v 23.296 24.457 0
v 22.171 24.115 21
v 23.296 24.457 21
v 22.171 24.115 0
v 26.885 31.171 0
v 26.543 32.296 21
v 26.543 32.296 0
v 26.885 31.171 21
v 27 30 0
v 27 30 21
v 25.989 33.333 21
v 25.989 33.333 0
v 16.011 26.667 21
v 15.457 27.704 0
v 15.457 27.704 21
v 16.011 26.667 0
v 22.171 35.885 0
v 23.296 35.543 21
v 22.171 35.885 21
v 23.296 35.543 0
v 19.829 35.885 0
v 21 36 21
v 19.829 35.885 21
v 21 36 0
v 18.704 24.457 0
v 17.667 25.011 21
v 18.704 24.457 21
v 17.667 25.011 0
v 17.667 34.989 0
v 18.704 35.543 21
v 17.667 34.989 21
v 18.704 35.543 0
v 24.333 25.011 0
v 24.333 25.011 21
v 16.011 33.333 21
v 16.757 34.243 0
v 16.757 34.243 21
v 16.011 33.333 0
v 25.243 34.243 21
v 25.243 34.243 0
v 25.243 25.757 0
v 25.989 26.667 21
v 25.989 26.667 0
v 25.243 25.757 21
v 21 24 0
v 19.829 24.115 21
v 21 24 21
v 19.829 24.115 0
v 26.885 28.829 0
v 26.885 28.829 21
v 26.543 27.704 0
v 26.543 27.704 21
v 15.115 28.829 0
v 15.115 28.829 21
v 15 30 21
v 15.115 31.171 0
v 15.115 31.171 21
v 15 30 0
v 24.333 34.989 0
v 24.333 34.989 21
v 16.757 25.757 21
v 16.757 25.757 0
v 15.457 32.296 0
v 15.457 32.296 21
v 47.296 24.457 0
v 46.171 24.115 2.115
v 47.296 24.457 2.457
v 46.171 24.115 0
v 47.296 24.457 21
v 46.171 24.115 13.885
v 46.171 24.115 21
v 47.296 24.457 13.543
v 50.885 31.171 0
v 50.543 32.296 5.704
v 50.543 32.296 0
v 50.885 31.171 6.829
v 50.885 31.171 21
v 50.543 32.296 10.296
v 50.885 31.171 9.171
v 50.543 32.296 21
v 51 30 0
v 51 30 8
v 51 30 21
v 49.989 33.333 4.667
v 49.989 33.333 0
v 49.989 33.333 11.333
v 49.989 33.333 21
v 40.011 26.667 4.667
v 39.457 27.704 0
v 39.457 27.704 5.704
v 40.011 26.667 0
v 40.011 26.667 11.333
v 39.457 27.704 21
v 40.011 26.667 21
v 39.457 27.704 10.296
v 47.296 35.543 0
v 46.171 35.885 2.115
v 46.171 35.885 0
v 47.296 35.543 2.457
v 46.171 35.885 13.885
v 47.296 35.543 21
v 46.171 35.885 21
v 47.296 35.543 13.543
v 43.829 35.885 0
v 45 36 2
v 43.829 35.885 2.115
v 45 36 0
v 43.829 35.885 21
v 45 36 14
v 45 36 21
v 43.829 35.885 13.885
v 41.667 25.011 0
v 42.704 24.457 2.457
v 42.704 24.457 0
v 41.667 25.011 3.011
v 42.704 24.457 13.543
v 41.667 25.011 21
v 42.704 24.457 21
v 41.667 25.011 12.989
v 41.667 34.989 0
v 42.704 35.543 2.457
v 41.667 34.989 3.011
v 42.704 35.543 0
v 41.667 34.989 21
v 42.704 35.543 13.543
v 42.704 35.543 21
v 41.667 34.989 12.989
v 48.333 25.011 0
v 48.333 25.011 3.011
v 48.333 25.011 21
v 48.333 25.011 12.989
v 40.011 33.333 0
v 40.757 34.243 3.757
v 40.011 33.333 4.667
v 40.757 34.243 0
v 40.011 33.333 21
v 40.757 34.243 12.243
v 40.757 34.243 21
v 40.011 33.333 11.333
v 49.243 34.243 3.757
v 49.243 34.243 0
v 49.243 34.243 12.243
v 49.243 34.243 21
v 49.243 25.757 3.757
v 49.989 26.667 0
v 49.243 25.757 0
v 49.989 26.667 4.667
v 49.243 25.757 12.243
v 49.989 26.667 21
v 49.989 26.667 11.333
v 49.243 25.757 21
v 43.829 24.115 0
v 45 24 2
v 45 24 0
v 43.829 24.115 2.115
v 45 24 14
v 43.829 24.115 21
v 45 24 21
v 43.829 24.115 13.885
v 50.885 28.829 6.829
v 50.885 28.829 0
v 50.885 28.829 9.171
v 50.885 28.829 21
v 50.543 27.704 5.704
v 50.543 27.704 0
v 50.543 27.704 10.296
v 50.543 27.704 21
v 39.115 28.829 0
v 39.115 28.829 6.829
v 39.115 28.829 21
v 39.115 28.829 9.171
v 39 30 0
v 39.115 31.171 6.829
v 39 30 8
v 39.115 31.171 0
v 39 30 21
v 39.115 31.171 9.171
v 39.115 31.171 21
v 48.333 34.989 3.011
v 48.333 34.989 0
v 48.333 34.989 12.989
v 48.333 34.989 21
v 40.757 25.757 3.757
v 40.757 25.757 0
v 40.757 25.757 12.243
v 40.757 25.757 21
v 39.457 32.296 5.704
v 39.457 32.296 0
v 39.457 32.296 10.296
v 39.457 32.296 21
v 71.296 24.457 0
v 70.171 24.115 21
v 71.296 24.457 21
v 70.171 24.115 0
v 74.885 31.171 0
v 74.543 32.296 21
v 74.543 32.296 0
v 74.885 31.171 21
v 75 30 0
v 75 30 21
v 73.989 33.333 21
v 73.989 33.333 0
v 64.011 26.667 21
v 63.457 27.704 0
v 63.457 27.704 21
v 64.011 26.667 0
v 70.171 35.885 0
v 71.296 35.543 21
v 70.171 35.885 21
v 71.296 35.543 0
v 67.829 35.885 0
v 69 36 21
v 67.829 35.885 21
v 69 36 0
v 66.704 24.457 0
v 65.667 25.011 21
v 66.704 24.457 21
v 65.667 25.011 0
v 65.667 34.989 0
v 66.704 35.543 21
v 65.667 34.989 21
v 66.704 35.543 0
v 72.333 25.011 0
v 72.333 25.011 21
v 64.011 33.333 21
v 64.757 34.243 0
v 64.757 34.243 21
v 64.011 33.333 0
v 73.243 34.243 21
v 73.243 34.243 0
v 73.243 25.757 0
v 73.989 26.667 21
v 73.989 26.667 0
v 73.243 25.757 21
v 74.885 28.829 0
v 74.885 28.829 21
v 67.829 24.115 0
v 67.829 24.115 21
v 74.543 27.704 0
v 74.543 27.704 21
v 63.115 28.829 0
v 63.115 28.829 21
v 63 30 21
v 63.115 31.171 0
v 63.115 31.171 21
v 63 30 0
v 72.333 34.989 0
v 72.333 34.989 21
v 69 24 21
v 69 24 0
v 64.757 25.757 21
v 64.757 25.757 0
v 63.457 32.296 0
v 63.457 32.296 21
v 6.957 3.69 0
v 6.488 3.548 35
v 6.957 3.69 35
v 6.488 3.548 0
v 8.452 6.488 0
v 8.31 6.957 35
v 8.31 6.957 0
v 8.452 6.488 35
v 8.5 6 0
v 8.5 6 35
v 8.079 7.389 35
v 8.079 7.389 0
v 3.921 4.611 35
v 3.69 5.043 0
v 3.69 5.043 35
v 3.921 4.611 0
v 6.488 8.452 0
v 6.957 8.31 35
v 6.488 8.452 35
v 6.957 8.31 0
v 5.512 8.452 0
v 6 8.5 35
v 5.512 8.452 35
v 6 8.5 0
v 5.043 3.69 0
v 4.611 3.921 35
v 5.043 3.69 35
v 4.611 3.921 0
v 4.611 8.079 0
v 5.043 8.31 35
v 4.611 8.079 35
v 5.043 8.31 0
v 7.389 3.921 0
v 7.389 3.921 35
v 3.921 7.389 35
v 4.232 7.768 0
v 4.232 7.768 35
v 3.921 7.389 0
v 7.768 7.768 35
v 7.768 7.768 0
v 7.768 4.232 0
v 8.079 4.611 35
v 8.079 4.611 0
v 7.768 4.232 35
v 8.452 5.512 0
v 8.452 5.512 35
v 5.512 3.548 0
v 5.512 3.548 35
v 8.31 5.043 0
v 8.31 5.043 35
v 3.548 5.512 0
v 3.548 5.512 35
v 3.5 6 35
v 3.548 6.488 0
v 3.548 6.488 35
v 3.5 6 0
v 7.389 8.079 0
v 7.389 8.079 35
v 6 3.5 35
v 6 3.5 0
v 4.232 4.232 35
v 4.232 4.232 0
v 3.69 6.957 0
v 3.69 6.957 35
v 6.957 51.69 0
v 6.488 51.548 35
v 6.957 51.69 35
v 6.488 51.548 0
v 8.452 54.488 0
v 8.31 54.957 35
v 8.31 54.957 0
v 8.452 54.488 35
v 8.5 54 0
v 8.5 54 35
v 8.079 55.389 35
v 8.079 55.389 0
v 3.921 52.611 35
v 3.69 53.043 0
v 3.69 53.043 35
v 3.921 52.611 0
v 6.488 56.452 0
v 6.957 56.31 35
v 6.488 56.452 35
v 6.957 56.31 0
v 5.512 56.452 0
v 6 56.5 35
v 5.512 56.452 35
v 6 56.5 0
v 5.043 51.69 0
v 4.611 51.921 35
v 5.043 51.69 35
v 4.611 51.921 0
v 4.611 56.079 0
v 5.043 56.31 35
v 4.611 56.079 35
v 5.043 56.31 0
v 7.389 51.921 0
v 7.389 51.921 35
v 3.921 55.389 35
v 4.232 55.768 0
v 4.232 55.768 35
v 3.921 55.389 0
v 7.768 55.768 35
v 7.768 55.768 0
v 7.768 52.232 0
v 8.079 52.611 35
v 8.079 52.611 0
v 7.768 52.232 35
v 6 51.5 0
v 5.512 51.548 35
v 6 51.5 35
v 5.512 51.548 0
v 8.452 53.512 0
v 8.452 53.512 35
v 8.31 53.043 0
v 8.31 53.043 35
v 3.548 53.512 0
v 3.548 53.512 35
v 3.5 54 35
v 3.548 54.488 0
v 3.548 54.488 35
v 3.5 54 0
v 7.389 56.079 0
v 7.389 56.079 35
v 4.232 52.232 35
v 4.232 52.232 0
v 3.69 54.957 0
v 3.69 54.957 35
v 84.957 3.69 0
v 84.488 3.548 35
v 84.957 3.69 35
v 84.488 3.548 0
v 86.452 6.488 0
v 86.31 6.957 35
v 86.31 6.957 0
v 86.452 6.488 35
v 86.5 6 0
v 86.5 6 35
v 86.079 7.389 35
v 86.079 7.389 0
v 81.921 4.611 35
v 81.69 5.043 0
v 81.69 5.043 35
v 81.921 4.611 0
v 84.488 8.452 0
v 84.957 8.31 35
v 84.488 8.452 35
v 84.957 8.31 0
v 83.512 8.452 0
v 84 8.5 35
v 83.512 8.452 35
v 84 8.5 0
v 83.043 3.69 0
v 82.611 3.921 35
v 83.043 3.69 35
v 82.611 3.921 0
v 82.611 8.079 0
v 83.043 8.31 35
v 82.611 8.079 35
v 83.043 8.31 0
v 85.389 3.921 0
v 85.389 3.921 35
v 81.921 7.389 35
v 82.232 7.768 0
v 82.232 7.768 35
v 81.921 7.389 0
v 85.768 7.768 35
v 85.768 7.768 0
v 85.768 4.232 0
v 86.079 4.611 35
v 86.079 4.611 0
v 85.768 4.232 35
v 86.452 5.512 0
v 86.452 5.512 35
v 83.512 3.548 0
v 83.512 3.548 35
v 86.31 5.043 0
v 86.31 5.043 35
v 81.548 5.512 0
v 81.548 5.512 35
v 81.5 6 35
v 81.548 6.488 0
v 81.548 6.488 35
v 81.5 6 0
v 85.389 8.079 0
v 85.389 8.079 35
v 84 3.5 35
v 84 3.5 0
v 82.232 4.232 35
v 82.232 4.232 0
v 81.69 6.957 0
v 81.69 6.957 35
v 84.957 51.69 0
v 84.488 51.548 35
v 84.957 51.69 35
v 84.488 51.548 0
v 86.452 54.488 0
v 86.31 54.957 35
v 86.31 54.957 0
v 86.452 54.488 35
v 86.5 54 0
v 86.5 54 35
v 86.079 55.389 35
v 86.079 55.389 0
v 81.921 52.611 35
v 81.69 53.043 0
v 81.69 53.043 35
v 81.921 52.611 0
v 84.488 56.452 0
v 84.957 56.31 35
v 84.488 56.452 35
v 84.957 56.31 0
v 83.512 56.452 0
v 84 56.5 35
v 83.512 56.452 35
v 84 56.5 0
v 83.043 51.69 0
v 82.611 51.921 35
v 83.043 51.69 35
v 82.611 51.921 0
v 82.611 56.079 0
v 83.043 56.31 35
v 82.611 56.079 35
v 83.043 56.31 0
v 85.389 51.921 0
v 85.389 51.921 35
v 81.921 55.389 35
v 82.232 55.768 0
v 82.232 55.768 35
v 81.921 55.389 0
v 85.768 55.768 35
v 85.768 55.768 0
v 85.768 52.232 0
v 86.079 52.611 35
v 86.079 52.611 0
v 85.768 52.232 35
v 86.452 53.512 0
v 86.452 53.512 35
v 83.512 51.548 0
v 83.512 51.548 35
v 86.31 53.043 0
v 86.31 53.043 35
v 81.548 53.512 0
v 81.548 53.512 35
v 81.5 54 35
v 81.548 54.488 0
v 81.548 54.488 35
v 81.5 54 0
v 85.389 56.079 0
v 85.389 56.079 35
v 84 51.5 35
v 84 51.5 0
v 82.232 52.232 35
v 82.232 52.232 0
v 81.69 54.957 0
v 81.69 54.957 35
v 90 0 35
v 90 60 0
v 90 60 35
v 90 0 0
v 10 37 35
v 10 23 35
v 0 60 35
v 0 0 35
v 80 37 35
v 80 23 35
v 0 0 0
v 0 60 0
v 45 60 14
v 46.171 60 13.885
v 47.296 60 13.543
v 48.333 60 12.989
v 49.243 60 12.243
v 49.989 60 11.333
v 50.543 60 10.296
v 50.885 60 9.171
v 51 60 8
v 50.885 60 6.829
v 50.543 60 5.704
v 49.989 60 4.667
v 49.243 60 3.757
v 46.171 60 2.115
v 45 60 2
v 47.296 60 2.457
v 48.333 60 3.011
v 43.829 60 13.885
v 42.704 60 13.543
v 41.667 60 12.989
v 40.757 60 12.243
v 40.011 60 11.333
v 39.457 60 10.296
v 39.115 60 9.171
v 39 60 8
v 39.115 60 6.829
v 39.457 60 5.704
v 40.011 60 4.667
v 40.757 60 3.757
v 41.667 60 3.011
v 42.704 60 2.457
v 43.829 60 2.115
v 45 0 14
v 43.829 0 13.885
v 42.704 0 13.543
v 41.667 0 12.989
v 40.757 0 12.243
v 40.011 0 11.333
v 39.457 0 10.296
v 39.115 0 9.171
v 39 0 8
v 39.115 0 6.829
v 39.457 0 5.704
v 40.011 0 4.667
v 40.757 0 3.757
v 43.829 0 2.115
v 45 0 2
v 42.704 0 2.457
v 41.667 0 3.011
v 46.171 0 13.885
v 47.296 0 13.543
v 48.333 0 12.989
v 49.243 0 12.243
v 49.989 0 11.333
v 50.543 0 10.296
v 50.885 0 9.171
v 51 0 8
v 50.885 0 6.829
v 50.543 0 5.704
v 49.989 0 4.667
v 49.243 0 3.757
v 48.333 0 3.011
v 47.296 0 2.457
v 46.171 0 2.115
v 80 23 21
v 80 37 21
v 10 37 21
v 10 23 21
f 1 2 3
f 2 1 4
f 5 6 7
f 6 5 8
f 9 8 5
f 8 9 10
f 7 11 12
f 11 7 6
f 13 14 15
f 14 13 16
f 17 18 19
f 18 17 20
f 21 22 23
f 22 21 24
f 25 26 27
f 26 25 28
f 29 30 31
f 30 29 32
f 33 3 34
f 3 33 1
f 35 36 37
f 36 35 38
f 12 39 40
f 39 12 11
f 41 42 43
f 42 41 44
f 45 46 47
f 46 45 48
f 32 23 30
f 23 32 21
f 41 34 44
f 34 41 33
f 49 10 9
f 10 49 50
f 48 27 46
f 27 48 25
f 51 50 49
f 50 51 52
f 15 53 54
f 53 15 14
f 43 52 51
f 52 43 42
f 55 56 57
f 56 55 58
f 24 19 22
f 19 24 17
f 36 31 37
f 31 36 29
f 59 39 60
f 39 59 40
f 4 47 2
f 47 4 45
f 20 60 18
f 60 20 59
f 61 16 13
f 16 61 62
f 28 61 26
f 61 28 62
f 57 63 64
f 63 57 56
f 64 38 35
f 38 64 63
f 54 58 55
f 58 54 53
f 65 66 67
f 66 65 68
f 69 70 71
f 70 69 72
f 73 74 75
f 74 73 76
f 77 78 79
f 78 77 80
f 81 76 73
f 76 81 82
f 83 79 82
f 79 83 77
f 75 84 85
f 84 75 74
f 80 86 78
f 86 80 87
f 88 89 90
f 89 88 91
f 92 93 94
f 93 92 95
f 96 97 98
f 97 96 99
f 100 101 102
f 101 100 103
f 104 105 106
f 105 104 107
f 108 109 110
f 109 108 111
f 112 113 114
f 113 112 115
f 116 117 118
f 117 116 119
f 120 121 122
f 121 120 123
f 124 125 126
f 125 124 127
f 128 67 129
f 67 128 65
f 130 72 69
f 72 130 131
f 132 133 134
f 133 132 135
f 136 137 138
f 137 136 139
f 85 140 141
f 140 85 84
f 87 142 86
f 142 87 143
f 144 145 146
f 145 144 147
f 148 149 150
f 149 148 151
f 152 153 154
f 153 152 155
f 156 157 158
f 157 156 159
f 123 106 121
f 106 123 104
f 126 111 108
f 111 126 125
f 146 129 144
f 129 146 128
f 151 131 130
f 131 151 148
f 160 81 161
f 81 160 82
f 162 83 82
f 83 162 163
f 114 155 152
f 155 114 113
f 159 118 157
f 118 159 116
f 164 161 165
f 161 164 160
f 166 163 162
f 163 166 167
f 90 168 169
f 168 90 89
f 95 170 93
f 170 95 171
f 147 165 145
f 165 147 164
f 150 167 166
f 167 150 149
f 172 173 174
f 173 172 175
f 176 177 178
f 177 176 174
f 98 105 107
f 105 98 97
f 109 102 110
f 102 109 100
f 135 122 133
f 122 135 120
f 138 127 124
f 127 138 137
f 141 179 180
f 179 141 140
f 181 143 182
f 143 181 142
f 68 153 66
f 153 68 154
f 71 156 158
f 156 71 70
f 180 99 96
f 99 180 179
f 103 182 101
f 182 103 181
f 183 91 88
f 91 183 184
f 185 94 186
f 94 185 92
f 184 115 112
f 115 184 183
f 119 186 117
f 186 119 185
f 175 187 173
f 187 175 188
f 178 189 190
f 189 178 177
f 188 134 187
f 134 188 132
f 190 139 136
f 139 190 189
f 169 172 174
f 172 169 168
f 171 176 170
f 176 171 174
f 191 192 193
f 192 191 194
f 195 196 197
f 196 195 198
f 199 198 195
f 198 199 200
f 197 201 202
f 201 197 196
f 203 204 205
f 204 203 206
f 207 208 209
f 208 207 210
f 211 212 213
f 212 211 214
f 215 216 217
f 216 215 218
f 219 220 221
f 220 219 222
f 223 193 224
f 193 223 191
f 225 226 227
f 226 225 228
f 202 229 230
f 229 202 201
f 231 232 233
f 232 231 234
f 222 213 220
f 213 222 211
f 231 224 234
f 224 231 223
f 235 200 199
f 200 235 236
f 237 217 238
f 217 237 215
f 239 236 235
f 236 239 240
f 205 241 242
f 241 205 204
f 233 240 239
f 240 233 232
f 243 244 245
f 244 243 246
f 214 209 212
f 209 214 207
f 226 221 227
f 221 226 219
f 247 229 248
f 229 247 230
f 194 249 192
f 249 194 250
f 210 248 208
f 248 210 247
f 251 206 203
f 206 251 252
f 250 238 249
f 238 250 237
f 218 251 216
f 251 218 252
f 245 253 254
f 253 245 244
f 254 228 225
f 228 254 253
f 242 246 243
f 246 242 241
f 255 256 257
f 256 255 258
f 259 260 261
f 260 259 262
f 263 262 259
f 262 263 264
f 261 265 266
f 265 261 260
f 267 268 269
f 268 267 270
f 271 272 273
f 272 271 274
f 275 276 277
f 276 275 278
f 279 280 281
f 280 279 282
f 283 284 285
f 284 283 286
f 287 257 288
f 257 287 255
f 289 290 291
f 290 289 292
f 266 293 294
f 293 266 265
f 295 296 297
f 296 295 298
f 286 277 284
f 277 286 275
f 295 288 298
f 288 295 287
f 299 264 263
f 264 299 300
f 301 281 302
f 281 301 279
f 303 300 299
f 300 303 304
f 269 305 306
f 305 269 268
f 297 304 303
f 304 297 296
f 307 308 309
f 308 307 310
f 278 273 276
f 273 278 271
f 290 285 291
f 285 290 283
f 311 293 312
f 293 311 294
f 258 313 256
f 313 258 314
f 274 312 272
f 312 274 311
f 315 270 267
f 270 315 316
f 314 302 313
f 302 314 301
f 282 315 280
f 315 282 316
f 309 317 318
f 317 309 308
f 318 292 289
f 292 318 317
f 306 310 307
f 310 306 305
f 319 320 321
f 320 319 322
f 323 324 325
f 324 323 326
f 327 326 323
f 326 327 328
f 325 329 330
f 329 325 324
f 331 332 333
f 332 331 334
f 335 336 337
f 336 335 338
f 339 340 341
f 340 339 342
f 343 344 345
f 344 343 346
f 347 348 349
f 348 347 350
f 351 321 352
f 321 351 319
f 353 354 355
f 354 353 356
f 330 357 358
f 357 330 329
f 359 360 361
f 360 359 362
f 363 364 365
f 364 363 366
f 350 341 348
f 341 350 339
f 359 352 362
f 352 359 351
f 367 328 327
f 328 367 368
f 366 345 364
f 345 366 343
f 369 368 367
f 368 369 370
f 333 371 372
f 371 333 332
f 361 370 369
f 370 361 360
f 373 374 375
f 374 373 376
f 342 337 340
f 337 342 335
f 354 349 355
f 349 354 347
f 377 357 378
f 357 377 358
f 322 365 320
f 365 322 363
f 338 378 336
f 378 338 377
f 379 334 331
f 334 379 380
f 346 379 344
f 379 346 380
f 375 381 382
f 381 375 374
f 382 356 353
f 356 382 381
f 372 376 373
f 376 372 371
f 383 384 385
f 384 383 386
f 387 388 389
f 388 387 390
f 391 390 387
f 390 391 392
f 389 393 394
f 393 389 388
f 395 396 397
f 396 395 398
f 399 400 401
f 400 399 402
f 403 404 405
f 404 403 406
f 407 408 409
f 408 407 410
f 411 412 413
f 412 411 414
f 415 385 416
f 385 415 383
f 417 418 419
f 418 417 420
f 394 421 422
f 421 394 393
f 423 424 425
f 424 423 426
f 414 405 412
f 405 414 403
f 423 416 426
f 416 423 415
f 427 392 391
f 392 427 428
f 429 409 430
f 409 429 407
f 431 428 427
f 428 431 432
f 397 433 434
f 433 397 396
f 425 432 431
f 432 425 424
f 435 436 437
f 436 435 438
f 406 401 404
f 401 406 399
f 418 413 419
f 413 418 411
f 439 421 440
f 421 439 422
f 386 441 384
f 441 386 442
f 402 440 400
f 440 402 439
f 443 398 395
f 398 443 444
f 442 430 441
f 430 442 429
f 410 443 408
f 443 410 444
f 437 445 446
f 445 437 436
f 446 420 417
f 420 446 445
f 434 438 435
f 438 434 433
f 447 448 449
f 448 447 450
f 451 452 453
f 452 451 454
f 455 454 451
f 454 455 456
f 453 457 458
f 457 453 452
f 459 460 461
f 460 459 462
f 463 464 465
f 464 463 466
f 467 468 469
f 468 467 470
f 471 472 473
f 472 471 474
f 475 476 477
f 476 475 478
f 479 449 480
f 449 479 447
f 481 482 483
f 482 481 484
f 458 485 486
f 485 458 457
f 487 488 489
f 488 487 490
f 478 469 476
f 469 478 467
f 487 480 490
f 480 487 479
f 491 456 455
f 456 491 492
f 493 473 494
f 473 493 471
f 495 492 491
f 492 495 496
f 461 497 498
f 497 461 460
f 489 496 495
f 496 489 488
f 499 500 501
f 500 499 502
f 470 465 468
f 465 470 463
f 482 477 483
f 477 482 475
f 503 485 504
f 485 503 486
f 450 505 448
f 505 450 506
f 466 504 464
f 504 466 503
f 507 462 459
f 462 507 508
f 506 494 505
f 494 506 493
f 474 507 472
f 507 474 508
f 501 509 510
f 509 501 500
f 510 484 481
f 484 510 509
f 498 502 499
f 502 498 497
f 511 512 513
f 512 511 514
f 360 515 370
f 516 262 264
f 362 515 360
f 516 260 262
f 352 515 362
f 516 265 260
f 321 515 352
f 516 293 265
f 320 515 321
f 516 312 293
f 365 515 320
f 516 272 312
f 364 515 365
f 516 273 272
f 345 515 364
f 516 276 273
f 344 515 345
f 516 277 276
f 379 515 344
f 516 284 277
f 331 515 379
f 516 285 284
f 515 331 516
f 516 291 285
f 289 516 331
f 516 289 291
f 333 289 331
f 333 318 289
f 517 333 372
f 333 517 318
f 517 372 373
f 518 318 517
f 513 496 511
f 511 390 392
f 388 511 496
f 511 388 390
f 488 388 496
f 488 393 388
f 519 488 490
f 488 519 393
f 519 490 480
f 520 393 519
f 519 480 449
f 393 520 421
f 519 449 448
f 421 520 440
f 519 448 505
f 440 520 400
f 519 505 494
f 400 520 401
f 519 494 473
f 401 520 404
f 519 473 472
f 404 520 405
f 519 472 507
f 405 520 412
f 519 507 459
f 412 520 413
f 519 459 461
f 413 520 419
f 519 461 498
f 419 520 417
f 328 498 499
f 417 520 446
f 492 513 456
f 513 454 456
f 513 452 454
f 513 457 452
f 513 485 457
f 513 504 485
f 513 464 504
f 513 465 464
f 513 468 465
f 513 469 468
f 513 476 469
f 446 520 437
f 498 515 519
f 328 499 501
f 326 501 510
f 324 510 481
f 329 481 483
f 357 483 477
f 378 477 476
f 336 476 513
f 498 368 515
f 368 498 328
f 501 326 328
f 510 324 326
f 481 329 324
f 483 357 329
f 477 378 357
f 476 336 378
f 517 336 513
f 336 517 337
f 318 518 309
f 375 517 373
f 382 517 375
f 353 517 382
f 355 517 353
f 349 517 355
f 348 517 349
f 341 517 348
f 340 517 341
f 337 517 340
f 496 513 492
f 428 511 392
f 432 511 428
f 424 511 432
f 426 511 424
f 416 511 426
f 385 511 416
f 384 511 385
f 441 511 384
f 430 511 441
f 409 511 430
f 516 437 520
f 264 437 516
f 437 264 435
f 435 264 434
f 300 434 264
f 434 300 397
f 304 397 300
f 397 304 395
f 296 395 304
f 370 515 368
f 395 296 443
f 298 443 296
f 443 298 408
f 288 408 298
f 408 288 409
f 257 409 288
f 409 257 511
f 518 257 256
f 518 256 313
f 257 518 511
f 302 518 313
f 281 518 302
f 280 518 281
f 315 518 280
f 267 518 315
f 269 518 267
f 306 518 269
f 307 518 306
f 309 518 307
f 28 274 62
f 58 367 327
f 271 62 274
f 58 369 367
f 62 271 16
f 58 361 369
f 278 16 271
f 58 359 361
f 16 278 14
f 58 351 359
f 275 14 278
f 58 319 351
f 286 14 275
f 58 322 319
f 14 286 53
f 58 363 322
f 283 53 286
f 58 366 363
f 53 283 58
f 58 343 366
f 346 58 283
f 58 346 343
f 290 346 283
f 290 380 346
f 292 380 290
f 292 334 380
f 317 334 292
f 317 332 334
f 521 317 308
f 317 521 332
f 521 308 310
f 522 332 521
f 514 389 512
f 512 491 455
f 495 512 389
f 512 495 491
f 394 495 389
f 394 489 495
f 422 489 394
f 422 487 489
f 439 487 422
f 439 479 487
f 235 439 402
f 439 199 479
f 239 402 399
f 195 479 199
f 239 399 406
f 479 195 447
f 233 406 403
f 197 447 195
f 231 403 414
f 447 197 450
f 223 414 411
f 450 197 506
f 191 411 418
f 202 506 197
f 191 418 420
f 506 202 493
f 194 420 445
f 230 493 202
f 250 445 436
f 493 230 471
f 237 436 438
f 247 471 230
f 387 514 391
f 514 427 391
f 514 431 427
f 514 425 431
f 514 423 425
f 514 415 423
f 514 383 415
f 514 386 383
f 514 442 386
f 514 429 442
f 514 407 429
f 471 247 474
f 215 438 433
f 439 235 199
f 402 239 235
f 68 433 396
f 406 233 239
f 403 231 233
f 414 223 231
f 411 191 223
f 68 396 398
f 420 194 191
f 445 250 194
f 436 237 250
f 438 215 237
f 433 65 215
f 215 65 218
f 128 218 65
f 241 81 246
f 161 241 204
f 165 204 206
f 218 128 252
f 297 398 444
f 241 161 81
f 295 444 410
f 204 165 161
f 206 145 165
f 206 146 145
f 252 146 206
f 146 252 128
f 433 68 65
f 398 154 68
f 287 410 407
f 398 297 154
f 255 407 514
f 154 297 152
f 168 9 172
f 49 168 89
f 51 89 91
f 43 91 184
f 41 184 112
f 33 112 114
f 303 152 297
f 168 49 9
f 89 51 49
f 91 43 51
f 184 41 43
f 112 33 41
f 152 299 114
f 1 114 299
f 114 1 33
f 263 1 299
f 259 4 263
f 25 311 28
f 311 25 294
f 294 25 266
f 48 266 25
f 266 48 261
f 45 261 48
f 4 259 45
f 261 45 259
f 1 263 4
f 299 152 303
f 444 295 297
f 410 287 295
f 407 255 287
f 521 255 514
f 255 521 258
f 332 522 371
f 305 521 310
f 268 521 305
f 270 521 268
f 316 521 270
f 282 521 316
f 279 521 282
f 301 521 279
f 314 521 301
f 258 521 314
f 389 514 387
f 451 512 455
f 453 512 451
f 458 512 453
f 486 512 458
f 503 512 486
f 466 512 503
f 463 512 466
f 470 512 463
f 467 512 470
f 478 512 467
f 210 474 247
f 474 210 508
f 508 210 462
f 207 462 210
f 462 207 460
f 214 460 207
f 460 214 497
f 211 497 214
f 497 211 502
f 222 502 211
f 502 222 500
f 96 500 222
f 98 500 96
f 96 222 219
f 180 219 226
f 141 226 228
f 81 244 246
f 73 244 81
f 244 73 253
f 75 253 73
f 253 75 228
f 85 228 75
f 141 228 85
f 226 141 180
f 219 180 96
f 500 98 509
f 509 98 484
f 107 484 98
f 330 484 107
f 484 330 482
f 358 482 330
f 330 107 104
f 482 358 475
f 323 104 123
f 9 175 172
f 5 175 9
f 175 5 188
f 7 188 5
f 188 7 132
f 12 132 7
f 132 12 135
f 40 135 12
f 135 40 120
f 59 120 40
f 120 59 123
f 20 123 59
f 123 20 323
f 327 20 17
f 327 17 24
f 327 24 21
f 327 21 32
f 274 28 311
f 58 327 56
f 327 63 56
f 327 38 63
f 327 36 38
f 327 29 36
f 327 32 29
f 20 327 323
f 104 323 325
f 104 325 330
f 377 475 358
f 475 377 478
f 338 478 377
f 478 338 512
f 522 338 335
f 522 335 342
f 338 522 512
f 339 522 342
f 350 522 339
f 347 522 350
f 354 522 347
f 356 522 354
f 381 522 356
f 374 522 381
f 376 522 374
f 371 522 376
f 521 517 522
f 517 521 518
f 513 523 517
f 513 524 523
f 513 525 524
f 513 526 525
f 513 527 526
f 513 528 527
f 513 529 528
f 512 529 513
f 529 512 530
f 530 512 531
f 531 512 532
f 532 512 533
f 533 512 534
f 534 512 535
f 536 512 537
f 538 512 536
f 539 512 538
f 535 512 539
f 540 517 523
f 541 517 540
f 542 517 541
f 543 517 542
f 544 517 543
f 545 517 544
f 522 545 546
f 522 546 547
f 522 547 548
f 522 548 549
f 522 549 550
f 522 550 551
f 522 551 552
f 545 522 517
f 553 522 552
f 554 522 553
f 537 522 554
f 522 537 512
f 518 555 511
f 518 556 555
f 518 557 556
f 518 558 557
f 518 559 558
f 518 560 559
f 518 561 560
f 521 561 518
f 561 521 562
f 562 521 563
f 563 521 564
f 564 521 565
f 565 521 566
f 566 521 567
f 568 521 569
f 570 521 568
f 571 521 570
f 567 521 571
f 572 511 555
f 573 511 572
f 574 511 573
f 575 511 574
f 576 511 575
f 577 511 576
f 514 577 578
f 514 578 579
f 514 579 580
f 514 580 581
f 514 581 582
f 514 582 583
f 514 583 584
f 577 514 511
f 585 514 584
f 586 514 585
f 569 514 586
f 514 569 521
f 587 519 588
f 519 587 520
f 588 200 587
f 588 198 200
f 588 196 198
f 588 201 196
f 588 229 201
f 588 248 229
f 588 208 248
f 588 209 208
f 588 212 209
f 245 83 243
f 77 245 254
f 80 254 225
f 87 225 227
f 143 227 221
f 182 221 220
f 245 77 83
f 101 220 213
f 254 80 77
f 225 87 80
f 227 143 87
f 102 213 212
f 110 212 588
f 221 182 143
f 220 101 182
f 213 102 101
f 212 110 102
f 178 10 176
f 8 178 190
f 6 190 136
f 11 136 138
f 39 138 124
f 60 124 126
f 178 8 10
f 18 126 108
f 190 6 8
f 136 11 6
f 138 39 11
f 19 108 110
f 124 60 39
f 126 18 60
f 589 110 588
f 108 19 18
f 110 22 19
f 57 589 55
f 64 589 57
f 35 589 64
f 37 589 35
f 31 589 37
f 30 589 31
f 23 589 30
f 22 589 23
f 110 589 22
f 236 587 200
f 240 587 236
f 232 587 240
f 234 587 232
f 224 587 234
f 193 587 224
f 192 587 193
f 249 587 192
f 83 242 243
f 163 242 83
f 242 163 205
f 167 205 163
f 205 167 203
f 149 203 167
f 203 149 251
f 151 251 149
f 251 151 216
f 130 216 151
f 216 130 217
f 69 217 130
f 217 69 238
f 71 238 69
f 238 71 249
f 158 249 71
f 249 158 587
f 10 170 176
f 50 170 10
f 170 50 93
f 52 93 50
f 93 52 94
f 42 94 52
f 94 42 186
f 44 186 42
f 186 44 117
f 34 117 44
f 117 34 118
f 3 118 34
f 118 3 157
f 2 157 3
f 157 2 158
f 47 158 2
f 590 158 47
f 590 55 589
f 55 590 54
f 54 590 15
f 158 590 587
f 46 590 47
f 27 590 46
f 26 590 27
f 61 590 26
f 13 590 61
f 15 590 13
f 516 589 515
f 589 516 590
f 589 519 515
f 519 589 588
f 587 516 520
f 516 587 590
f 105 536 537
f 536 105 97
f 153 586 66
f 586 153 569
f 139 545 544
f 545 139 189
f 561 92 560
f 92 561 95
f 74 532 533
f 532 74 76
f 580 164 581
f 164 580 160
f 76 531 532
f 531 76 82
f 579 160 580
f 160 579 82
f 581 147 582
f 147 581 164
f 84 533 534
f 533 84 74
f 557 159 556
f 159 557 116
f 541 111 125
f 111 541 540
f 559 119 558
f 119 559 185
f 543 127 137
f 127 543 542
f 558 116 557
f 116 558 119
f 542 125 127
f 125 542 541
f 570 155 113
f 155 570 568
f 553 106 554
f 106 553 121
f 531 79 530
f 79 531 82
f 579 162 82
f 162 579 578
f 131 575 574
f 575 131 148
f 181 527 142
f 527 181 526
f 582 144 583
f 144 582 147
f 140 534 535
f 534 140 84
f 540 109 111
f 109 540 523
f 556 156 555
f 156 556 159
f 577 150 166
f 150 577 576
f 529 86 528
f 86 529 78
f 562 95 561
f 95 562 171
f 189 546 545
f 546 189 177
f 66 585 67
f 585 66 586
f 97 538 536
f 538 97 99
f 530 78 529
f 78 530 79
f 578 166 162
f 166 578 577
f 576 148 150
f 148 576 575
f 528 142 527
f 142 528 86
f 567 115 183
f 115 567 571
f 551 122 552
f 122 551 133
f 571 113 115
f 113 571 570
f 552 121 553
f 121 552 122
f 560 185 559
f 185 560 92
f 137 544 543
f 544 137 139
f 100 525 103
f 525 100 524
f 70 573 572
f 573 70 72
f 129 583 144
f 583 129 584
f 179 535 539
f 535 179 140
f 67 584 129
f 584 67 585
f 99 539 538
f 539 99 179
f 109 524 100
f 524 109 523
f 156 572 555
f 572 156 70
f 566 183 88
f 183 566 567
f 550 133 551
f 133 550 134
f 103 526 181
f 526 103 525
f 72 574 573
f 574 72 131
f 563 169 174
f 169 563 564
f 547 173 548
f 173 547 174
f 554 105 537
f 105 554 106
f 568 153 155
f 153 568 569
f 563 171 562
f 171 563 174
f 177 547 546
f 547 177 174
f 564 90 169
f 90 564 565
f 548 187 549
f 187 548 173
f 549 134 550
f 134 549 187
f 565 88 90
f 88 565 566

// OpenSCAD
$fn = 32;

// ----------------------------------------------------------------------
// Manifold block: side_outlet manifold
// ----------------------------------------------------------------------

// --- parameters (mm) ---
block_l = 90;             // block length, X
block_w = 60;             // block width, Y
block_h = 35;             // block height, Z
port_d = 12;              // port bore diameter
port_pitch = 24;          // port pitch along X
gallery_d = 14;           // top gallery width, Y
gallery_depth = 14;       // gallery pocket depth
wall_p = 10;              // gallery end wall thickness, X
mnt_d = 5;                // mounting hole diameter
mnt_in = 6;               // mounting hole inset from the edges
out_d = 12;               // outlet bore diameter
out_z = 8;                // outlet axis height

n_ports = 3;  // ports in the row
port_x0 = (block_l - (n_ports - 1) * port_pitch) / 2;  // first port X

difference() {
  cube([block_l, block_w, block_h]);
  for (i = [0 : n_ports - 1])
    translate([port_x0 + i * port_pitch, block_w / 2, -1])
      cylinder(h = block_h + 2, d = port_d);
  translate([wall_p, block_w / 2 - gallery_d / 2, block_h - gallery_depth])
    cube([block_l - 2 * wall_p, gallery_d, gallery_depth + 1]);
  for (cx = [mnt_in, block_l - mnt_in])
    for (cy = [mnt_in, block_w - mnt_in])
      translate([cx, cy, -1]) cylinder(h = block_h + 2, d = mnt_d);
  translate([block_l / 2, -1, out_z]) rotate([-90, 0, 0])
    cylinder(h = block_w + 2, d = out_d);
}
